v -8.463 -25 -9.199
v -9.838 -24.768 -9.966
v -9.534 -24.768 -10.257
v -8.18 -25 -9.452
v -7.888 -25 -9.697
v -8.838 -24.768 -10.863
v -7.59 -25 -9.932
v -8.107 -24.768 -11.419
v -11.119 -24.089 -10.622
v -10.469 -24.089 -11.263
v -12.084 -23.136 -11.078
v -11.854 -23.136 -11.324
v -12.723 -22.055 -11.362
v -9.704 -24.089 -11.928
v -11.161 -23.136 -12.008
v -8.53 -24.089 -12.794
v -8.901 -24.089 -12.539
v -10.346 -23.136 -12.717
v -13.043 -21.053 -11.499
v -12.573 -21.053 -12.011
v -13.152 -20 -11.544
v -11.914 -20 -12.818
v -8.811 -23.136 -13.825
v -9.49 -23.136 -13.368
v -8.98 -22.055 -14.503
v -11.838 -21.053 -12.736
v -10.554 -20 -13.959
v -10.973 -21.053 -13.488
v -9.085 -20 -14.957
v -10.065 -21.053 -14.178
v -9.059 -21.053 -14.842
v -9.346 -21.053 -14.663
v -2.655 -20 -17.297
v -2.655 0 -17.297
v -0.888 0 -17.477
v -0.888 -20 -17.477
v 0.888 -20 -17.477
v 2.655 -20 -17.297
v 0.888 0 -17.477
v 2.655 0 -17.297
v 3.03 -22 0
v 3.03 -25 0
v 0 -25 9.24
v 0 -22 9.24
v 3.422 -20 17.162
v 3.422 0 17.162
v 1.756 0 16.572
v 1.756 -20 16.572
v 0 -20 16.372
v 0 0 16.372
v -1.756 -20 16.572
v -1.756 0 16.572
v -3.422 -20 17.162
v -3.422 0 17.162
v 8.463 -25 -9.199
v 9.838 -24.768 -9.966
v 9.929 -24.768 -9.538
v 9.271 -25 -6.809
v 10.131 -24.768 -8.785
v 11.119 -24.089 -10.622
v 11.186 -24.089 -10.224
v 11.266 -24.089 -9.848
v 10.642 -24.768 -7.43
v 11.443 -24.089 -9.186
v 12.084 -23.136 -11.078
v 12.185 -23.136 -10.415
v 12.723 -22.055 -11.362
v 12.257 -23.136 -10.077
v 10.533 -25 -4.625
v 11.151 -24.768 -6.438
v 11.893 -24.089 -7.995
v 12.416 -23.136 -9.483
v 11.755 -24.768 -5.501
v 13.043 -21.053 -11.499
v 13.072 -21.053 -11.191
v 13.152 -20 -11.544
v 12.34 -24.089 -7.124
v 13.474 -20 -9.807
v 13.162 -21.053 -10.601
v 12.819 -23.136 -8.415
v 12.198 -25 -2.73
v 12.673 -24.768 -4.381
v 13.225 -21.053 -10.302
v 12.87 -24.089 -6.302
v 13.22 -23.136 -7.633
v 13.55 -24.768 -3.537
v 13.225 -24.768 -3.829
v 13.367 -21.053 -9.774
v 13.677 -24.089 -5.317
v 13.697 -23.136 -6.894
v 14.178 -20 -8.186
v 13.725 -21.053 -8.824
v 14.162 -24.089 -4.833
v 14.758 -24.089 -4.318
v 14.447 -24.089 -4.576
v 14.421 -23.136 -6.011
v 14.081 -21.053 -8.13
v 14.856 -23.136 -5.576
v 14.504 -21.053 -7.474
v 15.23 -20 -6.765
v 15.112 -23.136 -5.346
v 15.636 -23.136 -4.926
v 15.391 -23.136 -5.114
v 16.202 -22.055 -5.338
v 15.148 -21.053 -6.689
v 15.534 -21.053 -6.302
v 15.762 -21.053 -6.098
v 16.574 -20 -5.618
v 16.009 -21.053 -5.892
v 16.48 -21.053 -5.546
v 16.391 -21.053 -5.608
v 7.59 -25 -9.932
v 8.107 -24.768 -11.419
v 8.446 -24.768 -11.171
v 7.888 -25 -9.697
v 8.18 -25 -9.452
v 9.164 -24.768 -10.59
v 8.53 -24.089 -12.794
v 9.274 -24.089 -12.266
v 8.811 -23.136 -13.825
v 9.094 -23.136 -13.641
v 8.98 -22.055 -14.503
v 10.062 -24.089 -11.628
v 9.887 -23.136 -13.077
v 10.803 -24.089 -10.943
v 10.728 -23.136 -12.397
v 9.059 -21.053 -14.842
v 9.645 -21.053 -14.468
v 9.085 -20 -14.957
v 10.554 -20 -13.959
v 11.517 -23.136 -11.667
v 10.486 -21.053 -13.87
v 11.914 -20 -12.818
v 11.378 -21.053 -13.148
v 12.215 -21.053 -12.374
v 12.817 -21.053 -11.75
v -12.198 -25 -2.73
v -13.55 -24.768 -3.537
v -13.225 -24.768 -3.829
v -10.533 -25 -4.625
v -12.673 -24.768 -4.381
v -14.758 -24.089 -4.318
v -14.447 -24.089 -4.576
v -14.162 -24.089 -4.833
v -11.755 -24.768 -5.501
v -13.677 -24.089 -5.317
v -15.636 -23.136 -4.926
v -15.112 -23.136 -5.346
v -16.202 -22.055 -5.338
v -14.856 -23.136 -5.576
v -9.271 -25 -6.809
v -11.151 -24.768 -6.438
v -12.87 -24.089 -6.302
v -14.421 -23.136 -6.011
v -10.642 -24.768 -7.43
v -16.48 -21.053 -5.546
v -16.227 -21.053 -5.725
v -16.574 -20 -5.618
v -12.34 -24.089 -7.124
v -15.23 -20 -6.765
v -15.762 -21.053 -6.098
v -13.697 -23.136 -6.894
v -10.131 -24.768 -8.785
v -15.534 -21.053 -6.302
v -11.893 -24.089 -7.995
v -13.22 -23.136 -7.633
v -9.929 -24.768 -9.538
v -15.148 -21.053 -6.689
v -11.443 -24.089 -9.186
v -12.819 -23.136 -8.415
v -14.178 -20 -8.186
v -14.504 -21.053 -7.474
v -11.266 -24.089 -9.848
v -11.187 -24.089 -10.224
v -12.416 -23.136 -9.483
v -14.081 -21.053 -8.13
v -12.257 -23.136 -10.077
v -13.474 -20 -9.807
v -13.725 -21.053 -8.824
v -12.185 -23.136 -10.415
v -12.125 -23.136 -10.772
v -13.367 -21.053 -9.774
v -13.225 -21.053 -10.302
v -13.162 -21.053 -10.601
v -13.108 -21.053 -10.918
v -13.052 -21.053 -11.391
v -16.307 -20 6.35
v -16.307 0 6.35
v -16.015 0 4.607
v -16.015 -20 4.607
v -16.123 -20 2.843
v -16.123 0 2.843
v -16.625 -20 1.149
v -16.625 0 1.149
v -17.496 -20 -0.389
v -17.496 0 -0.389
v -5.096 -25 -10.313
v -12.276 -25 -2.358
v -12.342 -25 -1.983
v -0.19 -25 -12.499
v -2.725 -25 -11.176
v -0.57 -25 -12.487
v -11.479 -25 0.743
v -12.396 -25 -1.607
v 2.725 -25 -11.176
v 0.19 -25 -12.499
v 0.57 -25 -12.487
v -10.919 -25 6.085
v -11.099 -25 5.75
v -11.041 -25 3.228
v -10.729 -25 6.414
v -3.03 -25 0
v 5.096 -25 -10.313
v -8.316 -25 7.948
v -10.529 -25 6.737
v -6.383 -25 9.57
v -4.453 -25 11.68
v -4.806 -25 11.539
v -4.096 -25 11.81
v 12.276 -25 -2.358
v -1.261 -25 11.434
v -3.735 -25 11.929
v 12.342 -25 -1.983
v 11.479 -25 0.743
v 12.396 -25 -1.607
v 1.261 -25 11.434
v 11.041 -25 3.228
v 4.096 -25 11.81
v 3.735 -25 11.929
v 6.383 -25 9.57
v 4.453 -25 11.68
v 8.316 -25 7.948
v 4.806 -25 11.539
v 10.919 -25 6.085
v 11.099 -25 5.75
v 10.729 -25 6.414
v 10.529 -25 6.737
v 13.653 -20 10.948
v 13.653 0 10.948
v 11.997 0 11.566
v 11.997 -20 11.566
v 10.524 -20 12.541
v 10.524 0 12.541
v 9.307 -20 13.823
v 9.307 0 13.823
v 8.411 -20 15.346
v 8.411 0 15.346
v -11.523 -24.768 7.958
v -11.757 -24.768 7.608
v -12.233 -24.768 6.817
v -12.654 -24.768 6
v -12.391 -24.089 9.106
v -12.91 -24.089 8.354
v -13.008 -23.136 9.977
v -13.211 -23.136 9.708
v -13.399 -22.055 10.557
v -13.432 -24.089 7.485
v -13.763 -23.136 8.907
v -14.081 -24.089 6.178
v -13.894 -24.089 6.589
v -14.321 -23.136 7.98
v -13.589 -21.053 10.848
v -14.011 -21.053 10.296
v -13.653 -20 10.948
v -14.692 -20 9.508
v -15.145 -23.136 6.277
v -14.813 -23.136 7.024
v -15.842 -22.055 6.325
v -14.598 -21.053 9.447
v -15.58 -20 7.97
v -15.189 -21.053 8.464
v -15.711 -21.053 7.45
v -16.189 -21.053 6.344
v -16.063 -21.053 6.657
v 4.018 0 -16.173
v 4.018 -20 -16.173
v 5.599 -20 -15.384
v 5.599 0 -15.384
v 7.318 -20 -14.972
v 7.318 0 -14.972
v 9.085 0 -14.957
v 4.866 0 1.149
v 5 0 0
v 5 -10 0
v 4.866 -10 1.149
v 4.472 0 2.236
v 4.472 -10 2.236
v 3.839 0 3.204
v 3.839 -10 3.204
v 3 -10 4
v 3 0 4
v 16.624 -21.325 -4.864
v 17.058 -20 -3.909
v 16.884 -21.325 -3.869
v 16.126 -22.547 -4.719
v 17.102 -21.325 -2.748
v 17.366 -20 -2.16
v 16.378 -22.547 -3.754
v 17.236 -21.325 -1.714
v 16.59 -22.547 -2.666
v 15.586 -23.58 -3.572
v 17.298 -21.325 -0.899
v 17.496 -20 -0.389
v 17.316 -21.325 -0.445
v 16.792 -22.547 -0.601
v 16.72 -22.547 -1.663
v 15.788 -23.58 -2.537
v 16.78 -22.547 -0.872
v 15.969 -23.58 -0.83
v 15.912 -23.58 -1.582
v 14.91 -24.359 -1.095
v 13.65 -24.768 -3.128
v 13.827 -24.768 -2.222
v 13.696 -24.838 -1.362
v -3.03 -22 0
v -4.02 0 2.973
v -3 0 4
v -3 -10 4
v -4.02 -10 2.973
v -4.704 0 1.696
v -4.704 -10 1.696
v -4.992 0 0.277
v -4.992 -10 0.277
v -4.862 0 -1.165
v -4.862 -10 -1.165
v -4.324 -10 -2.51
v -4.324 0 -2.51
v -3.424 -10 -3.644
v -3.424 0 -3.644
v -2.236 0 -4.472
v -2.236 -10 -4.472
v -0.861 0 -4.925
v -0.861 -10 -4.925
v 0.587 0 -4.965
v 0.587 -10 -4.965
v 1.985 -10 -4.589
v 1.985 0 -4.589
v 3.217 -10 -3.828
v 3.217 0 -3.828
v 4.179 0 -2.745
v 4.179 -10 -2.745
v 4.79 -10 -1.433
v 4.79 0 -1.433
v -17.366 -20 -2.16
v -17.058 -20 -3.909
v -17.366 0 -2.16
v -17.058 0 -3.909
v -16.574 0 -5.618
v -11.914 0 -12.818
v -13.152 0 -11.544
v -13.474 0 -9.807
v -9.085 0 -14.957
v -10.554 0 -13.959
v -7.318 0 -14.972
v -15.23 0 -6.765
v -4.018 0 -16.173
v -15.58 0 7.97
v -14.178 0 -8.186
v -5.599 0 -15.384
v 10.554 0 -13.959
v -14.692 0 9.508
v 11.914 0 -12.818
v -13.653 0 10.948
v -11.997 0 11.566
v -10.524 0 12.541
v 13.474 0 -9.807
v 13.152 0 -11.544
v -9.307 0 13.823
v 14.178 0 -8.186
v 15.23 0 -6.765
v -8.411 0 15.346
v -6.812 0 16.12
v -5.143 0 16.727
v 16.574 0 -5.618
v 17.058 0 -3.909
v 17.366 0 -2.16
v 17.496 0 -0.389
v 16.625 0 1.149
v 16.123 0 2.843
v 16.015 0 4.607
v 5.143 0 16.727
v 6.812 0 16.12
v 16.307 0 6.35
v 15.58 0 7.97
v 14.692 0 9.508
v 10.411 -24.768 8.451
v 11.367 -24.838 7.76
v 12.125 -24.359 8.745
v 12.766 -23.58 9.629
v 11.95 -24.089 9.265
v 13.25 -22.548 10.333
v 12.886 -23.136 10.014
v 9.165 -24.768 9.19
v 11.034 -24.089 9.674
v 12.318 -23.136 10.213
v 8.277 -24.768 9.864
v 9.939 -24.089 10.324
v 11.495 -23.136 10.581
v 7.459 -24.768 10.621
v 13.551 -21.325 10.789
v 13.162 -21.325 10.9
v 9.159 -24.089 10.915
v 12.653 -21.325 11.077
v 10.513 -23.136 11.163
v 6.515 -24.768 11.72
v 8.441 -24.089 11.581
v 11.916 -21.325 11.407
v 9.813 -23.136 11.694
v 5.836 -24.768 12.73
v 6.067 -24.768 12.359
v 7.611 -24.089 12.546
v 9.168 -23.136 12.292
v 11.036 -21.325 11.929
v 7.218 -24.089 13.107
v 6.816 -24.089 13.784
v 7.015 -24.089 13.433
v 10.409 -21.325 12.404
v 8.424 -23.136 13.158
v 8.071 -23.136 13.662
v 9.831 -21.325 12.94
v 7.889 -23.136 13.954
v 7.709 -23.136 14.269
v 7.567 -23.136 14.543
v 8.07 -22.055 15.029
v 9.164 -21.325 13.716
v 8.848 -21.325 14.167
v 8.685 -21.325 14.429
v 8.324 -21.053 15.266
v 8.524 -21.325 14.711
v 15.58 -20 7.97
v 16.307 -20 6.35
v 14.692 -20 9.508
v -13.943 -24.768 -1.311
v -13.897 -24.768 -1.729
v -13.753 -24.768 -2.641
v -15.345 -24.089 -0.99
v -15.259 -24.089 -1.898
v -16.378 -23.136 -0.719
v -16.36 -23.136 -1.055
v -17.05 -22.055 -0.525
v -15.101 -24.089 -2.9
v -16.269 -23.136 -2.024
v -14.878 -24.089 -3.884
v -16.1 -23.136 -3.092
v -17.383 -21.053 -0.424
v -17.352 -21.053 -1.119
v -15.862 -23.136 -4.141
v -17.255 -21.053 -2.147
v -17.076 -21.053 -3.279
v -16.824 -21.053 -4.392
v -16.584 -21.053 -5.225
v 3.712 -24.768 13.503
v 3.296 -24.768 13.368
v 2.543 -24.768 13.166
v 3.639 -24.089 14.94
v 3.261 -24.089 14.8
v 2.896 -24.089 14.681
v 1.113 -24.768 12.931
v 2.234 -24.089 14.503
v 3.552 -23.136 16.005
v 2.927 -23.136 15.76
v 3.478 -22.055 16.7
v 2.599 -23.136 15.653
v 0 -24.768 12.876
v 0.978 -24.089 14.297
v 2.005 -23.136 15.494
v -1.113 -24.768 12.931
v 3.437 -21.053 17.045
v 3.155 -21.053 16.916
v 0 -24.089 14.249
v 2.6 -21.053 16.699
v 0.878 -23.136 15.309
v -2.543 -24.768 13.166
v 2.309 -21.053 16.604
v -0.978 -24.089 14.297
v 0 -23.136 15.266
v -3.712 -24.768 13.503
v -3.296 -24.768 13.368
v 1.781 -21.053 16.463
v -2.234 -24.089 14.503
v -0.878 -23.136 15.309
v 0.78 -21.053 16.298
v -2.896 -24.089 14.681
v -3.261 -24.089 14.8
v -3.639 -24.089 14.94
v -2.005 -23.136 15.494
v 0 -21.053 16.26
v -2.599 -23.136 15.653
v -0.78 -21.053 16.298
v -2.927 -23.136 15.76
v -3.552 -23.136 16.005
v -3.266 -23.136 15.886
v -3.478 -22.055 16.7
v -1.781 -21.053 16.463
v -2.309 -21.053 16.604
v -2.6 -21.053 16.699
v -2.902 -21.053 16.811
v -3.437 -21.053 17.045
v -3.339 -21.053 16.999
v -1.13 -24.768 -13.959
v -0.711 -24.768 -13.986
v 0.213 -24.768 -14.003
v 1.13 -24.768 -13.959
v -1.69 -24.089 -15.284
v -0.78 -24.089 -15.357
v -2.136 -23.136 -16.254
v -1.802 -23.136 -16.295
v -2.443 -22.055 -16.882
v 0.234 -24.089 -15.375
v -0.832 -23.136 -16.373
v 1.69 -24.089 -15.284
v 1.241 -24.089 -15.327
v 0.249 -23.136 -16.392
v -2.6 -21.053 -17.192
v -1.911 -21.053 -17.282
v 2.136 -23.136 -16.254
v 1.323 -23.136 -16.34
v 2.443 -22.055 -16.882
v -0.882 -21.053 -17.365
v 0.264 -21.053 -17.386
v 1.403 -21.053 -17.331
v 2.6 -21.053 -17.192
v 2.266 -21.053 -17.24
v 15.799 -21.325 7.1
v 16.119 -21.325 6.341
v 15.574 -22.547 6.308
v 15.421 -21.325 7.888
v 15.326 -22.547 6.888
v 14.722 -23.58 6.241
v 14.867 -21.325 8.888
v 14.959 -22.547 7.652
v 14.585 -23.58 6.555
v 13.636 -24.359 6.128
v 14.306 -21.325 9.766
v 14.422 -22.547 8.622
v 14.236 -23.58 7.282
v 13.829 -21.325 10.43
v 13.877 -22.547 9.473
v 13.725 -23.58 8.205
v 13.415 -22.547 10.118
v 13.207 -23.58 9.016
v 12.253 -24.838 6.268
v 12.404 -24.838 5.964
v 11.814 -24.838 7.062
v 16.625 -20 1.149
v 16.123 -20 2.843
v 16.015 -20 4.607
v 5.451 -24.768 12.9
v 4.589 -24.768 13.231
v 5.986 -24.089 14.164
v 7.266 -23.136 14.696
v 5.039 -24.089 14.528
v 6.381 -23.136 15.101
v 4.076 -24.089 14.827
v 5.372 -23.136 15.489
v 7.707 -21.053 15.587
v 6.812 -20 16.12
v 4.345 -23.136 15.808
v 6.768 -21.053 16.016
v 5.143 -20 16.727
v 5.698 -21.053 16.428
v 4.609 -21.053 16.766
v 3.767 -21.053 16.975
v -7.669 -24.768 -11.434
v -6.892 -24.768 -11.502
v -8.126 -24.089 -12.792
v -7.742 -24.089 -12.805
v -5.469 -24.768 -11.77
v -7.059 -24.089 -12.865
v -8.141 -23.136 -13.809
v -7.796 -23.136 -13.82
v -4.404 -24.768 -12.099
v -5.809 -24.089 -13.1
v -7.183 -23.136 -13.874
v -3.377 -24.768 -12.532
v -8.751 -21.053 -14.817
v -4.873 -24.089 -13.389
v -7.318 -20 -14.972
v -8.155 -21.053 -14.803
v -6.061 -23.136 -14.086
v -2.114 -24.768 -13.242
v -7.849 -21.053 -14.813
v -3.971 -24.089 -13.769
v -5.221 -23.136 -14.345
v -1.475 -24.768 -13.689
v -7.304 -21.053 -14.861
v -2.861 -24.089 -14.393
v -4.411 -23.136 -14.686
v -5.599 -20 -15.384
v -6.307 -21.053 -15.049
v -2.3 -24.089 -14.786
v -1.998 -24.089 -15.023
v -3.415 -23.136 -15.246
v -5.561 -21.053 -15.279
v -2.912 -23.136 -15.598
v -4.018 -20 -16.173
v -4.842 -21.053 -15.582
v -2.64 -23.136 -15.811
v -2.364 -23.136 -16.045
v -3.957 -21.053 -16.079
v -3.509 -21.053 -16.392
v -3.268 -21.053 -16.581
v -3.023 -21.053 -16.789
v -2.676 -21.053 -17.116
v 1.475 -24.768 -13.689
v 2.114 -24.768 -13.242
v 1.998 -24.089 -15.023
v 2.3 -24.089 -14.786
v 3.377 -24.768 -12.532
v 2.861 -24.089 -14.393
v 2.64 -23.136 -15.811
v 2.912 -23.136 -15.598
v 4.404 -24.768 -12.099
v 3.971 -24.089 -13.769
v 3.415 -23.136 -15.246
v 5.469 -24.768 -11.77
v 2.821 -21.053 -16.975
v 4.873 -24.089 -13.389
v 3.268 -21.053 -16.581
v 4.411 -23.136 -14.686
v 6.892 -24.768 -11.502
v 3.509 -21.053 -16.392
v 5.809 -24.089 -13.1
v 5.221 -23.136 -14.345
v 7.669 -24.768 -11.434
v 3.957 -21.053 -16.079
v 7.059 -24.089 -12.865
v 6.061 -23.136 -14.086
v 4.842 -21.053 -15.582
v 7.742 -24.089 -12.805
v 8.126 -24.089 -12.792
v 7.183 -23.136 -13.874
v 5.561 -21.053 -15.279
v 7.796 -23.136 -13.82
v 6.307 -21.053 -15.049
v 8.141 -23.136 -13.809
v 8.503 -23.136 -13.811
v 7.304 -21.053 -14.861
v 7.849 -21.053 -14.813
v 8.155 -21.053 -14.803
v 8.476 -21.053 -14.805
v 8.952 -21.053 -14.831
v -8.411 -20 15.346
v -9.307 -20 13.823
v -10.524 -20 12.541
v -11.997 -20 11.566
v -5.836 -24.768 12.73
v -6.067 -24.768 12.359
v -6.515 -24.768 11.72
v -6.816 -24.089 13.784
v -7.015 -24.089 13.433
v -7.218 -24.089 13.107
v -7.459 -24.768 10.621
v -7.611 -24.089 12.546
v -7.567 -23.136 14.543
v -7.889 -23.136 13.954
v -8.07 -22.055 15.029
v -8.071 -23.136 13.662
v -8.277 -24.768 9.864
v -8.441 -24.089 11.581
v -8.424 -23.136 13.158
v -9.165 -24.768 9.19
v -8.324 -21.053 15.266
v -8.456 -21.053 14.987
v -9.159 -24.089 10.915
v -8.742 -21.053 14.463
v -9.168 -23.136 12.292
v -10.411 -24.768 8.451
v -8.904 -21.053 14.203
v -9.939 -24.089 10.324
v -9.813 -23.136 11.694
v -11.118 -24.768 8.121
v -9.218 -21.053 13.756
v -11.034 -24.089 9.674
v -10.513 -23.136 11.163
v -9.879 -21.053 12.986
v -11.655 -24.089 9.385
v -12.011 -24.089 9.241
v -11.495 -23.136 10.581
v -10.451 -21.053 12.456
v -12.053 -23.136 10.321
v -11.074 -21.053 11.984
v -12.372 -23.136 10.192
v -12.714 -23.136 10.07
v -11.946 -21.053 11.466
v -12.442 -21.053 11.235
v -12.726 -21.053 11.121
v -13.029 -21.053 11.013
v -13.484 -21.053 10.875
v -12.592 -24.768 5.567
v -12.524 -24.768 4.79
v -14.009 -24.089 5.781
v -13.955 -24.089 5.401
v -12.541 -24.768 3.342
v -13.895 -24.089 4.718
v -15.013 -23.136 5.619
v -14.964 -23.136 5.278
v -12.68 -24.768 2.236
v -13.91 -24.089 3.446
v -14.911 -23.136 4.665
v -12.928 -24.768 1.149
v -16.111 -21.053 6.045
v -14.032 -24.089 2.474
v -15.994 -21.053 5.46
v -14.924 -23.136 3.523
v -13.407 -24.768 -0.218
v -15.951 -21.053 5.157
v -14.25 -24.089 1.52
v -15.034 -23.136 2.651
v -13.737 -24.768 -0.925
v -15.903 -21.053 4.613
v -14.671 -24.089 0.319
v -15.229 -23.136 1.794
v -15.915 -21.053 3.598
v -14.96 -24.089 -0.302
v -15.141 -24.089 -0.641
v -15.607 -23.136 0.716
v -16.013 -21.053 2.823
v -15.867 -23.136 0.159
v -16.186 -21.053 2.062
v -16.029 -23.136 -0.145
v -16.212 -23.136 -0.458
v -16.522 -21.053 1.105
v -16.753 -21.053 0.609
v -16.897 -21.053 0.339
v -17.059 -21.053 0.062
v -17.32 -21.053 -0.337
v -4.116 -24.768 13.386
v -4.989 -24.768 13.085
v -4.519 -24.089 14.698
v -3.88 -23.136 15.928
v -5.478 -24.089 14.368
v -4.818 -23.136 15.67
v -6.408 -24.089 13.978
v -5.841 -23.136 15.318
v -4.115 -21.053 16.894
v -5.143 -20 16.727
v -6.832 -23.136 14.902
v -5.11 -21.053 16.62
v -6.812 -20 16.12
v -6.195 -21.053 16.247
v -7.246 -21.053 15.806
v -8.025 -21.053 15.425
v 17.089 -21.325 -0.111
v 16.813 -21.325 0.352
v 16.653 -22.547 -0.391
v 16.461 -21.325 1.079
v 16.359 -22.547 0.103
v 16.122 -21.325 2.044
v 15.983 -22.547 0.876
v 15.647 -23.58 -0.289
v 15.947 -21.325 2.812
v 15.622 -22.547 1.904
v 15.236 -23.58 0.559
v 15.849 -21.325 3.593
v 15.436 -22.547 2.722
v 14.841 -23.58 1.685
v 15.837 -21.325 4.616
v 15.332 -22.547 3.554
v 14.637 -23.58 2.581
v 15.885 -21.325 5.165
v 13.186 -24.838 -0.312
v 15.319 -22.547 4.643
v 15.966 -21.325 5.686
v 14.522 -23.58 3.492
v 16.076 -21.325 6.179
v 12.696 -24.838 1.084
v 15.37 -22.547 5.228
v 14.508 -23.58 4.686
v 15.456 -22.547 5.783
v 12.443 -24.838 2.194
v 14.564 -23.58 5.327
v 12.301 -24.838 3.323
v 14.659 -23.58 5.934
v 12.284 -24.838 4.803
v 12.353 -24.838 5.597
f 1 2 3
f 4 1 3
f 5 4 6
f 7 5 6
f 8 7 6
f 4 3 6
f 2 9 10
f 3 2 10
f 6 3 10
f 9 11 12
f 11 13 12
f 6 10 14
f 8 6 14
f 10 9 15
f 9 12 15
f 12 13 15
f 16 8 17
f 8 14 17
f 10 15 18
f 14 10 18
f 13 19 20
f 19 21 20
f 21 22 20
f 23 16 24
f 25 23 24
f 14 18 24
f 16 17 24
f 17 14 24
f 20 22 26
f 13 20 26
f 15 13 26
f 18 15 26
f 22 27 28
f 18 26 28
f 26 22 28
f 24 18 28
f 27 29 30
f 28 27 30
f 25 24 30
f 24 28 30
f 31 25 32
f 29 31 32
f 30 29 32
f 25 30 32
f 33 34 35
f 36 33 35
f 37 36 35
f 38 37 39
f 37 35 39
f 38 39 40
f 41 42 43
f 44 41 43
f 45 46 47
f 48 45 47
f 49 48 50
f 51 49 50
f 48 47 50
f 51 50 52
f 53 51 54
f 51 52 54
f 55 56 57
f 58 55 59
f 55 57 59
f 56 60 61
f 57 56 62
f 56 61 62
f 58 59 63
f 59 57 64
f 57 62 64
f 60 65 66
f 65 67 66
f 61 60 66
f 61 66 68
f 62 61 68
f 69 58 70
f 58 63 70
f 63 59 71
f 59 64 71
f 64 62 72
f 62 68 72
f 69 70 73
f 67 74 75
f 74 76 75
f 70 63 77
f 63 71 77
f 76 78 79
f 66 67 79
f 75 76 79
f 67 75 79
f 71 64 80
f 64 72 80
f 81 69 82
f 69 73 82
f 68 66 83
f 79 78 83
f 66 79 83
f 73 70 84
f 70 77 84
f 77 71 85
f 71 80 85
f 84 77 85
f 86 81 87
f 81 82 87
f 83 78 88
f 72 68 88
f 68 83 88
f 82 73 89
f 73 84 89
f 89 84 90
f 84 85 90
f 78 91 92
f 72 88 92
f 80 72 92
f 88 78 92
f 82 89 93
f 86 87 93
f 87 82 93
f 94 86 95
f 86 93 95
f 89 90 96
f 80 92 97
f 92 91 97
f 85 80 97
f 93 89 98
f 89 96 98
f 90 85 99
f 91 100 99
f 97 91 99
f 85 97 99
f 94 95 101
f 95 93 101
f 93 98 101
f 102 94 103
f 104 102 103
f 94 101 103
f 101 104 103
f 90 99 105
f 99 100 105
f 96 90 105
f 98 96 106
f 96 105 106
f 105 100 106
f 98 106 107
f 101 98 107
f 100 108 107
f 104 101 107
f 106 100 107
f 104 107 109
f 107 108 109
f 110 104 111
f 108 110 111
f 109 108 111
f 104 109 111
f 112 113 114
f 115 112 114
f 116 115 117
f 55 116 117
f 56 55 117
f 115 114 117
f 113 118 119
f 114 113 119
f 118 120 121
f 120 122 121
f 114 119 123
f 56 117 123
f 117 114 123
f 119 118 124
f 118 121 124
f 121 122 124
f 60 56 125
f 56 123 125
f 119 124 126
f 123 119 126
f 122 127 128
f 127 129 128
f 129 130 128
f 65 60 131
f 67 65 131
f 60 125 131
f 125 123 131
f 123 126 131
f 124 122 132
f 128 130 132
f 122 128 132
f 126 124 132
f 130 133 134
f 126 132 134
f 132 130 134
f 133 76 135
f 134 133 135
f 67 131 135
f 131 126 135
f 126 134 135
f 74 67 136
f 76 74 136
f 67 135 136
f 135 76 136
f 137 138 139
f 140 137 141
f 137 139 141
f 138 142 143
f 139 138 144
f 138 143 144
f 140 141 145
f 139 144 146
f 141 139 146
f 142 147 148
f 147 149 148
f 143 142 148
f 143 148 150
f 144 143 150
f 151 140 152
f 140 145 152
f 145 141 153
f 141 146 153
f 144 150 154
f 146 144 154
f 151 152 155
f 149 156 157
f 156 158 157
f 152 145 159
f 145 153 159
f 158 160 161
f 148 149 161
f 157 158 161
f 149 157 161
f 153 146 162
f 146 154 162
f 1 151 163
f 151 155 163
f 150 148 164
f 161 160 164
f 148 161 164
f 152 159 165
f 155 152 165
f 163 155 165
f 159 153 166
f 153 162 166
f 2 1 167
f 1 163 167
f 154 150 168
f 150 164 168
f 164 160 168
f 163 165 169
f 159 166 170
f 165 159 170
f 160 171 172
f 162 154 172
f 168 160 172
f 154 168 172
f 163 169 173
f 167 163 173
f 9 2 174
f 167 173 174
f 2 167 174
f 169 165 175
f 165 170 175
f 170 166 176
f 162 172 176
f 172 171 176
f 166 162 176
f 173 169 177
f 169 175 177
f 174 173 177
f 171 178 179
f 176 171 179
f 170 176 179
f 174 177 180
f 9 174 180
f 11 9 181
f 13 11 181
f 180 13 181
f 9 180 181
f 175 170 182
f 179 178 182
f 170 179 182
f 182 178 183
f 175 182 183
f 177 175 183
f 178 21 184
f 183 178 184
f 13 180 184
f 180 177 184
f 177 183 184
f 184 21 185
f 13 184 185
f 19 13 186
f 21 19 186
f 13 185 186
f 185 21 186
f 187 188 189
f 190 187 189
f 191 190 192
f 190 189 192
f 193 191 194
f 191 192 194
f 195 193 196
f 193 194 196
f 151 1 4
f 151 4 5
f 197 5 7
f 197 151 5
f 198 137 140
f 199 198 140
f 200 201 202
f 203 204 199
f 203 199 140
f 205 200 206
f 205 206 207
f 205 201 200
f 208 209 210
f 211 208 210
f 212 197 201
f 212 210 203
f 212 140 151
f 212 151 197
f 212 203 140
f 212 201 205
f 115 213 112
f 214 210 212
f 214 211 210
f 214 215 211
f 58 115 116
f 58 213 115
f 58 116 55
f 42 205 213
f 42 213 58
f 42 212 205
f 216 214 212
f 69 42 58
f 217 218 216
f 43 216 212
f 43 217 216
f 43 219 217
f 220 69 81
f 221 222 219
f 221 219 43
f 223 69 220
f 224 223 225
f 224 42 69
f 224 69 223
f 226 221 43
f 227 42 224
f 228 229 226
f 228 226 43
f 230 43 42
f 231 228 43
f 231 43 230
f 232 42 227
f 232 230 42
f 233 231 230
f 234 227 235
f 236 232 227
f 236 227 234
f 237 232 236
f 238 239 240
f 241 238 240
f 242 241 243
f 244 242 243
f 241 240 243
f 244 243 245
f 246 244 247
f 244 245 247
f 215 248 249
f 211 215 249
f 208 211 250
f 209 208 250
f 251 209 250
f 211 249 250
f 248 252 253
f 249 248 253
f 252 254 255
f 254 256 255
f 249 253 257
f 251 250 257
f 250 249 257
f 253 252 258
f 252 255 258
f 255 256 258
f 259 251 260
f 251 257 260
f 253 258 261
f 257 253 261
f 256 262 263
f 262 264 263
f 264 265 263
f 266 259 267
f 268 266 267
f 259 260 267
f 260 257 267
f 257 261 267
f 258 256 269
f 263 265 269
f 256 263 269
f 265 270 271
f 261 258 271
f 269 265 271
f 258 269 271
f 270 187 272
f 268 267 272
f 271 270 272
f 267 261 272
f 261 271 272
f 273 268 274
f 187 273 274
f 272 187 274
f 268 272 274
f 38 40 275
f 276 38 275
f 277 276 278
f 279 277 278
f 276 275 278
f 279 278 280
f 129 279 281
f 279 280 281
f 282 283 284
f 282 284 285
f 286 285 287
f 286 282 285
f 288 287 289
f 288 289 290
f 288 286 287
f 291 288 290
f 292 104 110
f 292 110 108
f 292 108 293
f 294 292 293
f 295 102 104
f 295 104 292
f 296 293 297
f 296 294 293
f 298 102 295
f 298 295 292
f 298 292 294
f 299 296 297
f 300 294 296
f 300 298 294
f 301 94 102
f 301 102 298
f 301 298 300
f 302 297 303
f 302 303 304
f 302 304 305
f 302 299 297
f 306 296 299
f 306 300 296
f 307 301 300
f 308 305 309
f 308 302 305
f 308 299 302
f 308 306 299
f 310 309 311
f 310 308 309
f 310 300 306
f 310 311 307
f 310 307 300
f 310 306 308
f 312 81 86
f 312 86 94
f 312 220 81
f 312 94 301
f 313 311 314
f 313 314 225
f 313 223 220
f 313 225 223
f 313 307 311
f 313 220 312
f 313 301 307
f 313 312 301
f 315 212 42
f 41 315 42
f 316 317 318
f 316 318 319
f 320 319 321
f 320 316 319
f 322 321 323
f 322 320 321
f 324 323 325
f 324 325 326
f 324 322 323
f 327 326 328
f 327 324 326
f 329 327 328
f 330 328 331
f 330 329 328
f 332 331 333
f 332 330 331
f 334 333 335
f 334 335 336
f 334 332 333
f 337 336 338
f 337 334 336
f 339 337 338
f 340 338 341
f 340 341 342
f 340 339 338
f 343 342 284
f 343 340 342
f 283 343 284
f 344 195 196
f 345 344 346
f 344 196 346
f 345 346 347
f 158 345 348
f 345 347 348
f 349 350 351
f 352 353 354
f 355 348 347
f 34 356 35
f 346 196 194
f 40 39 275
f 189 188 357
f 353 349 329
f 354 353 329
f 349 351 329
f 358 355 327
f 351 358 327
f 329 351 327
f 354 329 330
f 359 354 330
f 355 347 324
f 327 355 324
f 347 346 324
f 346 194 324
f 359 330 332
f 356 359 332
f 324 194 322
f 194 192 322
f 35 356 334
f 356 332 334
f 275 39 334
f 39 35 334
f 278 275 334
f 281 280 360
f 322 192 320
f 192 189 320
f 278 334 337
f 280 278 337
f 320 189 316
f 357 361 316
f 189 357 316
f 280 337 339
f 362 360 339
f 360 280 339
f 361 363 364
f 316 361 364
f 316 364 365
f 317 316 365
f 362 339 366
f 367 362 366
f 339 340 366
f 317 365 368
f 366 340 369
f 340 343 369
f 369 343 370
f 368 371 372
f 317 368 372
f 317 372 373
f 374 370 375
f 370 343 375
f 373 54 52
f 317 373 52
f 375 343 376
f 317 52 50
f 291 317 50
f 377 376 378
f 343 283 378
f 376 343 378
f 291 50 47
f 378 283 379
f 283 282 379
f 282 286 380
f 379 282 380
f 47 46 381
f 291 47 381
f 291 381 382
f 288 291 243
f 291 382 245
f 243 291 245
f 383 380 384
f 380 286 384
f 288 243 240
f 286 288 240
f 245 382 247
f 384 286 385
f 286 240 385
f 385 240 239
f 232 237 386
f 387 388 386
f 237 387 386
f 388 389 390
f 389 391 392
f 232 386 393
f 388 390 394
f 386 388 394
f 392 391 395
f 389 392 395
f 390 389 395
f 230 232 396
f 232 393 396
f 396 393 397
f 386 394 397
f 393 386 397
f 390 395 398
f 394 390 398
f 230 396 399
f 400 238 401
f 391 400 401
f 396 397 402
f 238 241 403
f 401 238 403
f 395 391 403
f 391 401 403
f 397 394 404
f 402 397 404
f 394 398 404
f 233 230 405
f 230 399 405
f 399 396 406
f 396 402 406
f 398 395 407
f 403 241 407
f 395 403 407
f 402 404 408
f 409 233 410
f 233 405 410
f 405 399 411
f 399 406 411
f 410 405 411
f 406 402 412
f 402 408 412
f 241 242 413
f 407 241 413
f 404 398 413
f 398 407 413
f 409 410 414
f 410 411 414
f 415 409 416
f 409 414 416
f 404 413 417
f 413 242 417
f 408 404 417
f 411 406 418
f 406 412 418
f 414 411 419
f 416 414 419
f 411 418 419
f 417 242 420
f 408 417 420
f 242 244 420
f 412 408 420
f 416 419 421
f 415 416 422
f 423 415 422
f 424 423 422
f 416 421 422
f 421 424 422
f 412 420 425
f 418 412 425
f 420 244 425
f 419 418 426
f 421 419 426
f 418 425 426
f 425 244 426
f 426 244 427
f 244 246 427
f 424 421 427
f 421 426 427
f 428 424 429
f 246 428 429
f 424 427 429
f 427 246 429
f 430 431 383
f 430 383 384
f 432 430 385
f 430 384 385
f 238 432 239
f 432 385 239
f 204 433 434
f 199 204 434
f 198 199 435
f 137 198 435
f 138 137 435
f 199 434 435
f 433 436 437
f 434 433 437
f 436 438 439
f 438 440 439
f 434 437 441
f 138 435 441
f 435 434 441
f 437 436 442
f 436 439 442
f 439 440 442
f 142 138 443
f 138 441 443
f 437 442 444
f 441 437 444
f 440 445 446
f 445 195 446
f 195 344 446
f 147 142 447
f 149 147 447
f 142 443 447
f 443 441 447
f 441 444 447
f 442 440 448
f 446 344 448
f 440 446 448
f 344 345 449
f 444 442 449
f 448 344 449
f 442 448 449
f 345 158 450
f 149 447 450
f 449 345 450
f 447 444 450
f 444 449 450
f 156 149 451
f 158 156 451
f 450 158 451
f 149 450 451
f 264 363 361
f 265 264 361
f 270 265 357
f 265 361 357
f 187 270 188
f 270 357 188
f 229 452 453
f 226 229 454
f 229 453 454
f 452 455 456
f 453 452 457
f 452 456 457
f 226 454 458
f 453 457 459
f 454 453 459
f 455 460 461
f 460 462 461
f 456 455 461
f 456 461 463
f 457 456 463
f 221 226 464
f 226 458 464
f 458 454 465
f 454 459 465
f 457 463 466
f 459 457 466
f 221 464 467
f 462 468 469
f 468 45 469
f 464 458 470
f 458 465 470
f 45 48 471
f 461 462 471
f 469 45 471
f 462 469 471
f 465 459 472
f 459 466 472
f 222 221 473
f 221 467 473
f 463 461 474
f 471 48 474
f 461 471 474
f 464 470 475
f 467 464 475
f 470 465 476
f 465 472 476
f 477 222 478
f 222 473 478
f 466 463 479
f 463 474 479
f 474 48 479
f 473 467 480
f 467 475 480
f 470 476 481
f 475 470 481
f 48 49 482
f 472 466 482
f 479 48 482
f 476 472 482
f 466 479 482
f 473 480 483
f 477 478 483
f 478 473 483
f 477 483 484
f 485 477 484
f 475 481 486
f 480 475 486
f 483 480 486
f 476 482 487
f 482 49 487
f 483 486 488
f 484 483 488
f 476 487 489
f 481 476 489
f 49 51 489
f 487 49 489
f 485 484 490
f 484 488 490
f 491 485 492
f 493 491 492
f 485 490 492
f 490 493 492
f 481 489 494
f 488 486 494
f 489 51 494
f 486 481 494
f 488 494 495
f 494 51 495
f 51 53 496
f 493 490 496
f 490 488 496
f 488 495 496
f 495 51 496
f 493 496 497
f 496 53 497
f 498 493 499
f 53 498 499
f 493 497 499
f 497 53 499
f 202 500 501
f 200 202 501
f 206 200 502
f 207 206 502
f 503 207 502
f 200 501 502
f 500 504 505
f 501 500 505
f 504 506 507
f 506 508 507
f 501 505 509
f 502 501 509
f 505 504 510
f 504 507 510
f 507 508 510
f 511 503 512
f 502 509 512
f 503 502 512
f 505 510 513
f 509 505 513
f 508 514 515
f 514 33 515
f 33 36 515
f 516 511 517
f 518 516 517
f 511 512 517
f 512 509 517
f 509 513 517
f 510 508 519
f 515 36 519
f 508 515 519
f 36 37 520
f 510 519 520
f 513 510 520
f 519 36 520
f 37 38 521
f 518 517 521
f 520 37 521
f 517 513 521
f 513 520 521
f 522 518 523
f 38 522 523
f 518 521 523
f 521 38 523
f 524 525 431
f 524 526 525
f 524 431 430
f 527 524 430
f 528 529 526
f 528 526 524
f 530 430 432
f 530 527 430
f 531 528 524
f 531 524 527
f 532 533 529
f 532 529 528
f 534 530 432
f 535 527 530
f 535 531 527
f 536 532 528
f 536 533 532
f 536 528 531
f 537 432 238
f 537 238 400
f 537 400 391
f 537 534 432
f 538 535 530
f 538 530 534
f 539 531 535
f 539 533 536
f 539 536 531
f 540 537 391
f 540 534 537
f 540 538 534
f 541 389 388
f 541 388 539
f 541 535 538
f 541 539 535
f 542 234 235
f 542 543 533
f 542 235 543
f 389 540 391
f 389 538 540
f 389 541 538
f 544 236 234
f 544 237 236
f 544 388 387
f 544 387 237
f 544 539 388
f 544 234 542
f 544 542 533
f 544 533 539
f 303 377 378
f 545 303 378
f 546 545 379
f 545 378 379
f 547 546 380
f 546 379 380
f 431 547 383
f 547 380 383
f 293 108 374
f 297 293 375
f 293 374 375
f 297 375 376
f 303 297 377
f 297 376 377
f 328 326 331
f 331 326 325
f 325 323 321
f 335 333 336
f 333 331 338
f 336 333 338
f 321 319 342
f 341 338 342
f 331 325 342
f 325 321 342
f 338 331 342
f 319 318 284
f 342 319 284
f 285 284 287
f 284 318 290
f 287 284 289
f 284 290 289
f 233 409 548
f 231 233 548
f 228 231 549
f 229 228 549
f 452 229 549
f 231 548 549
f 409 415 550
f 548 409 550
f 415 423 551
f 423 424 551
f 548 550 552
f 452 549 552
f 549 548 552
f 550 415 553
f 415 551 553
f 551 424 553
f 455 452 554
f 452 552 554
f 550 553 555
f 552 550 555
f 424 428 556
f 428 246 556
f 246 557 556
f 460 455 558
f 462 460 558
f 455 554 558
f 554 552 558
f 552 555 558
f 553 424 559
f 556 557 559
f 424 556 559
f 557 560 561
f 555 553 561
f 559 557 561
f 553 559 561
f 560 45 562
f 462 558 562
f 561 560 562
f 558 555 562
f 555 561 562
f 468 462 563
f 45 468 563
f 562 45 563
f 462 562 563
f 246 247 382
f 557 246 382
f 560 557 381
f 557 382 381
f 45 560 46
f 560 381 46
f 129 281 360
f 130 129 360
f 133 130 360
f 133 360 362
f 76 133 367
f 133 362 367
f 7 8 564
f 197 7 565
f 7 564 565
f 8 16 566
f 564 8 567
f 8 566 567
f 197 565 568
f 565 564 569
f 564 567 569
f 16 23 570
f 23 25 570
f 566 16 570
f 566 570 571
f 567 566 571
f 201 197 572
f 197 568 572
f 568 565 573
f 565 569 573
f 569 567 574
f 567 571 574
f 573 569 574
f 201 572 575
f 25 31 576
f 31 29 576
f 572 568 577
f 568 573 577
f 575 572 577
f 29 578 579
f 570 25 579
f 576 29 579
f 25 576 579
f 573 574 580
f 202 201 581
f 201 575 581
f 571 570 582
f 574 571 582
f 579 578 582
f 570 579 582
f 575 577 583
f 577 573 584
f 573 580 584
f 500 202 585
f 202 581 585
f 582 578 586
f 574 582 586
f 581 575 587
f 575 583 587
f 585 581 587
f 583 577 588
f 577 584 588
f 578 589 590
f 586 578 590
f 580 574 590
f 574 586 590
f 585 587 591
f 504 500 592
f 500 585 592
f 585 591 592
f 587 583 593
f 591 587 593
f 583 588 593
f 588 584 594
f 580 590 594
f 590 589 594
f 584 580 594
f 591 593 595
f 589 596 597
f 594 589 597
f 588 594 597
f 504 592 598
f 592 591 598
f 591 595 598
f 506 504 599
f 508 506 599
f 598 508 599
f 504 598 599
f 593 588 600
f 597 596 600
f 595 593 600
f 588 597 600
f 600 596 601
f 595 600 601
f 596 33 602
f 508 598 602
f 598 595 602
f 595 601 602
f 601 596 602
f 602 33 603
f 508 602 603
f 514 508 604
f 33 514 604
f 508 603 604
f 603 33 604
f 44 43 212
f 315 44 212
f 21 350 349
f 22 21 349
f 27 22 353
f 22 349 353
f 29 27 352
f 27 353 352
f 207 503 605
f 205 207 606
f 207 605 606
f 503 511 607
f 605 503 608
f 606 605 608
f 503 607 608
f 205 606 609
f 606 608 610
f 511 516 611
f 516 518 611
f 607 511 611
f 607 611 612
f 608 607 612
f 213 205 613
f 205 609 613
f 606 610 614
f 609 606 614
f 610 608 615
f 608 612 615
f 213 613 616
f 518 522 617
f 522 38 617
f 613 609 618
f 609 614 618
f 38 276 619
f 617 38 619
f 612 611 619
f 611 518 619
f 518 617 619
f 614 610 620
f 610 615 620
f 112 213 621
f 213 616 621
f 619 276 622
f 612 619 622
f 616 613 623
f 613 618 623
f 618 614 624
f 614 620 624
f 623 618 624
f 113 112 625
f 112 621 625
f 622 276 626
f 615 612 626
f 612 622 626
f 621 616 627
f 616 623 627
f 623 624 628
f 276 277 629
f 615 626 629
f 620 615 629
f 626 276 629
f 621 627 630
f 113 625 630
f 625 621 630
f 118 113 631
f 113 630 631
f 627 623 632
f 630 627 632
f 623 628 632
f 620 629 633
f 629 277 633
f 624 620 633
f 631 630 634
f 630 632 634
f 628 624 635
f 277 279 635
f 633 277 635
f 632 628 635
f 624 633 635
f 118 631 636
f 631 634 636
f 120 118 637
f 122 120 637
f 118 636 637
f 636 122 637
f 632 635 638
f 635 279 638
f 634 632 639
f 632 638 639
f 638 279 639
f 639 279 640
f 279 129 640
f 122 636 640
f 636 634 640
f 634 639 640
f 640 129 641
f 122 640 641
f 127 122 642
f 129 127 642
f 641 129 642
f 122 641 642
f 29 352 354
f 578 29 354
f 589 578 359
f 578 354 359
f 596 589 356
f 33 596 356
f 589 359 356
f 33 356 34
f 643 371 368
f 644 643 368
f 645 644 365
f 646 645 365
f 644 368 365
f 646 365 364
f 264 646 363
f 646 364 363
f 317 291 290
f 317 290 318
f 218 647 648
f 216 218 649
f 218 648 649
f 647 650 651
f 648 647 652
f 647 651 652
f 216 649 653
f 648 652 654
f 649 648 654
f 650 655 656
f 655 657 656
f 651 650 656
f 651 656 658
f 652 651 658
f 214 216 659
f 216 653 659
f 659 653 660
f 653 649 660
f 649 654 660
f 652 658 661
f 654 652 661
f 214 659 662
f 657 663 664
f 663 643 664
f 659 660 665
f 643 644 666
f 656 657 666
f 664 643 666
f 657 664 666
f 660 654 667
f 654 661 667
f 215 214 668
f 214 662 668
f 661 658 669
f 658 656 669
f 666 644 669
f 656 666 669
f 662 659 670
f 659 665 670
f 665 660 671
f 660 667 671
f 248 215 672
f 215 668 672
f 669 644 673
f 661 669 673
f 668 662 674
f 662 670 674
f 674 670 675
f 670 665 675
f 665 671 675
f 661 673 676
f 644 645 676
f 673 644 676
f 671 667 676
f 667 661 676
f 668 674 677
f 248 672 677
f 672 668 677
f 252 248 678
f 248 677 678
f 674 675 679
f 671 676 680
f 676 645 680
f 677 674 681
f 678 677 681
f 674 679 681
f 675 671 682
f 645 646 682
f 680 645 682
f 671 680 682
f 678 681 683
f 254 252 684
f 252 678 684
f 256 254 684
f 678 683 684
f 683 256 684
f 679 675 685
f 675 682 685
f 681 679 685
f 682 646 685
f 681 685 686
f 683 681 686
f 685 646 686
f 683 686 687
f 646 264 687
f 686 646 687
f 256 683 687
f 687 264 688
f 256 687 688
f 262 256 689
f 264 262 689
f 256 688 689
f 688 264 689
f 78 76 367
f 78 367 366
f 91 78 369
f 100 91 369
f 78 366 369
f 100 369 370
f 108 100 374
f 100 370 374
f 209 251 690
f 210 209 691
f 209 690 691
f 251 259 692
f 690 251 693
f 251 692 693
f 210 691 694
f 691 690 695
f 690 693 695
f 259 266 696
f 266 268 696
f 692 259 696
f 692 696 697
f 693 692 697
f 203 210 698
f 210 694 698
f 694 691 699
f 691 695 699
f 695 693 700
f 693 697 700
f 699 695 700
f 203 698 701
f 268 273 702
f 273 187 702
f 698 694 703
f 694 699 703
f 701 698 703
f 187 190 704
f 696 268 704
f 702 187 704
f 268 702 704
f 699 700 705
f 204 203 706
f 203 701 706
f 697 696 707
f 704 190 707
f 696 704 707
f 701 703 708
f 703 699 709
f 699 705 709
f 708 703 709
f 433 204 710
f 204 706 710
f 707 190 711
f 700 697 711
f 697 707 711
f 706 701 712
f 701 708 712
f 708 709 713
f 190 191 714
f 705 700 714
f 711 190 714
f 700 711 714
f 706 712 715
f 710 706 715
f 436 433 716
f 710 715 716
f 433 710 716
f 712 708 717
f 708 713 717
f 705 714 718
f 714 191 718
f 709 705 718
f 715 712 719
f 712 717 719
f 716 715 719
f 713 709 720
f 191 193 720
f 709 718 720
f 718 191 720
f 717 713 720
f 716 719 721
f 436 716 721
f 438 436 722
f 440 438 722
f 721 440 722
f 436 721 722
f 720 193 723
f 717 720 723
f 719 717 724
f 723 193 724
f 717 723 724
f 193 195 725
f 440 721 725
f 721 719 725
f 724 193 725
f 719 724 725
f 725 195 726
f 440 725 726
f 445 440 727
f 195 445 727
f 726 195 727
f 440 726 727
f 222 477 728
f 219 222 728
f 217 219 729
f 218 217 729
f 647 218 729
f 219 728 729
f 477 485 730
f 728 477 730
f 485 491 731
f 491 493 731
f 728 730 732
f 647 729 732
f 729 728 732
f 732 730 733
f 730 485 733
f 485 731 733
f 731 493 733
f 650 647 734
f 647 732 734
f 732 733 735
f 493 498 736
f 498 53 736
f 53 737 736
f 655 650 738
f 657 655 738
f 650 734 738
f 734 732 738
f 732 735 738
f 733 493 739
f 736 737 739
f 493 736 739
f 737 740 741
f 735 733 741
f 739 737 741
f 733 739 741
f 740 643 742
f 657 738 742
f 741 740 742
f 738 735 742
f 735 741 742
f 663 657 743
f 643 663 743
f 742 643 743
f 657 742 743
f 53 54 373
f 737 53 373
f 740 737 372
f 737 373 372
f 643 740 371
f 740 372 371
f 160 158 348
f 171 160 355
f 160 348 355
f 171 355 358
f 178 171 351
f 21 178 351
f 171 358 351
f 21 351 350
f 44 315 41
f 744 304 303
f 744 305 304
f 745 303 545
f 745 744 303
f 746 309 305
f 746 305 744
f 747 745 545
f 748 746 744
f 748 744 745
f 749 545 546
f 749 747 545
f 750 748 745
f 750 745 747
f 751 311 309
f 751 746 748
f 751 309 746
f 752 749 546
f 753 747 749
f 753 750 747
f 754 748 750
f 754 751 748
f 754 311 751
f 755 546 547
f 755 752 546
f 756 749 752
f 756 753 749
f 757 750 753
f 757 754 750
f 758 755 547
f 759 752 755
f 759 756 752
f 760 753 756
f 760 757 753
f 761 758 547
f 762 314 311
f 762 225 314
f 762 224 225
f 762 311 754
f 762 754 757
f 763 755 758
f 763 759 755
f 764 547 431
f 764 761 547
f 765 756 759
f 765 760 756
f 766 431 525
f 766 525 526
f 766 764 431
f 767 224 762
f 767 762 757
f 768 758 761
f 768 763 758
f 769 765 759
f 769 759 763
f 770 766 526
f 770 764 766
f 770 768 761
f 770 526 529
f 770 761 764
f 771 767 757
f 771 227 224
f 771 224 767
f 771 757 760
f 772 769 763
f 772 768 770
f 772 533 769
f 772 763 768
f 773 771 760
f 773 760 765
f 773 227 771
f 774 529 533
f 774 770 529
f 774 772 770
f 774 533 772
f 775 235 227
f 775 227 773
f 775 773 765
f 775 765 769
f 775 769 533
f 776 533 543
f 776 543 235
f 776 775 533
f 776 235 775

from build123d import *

# Parameters (mm, degrees)
F1_DEPTH = 25
F2_DEPTH = 10
F3_R     = 5
F5_DEPTH = 3


with BuildPart() as f1:
    # F0 (on Front) → F1 (new body)
    with BuildSketch(Plane.XZ):
        with BuildLine():
            ThreePointArc((17.495668, -0.389351), (16.123041, 2.842927), (16.307385, 6.349741))
            ThreePointArc((16.307385, 6.349741), (15.155445, 8.75), (13.652729, 10.947739))
            ThreePointArc((13.652729, 10.947739), (10.523567, 12.541499), (8.410647, 15.346368))
            ThreePointArc((8.410647, 15.346368), (5.985353, 16.444621), (3.421526, 17.16226))
            ThreePointArc((3.421526, 17.16226), (0, 16.371764), (-3.421526, 17.16226))
            ThreePointArc((-3.421526, 17.16226), (-5.985353, 16.444621), (-8.410647, 15.346368))
            ThreePointArc((-8.410647, 15.346368), (-10.523567, 12.541499), (-13.652729, 10.947739))
            ThreePointArc((-13.652729, 10.947739), (-15.155445, 8.75), (-16.307385, 6.349741))
            ThreePointArc((-16.307385, 6.349741), (-16.123041, 2.842927), (-17.495668, -0.389351))
            ThreePointArc((-17.495668, -0.389351), (-17.234136, -3.038843), (-16.573716, -5.618001))
            ThreePointArc((-16.573716, -5.618001), (-14.178364, -8.185882), (-13.15219, -11.544259))
            ThreePointArc((-13.15219, -11.544259), (-11.248783, -13.405778), (-9.085022, -14.957018))
            ThreePointArc((-9.085022, -14.957018), (-5.599473, -15.384426), (-2.654655, -17.29748))
            ThreePointArc((-2.654655, -17.29748), (0, -17.5), (2.654655, -17.29748))
            ThreePointArc((2.654655, -17.29748), (5.599473, -15.384426), (9.085022, -14.957018))
            ThreePointArc((9.085022, -14.957018), (11.248783, -13.405778), (13.15219, -11.544259))
            ThreePointArc((13.15219, -11.544259), (14.178364, -8.185882), (16.573716, -5.618001))
            ThreePointArc((16.573716, -5.618001), (17.234136, -3.038843), (17.495668, -0.389351))
        make_face()
        with BuildLine():
            ThreePointArc((3, 4), (4.472136, 2.236068), (5, 0))
            ThreePointArc((5, 0), (-2.236068, -4.472136), (-3, 4))
            ThreePointArc((-3, 4), (0, 5), (3, 4))
        make_face(mode=Mode.SUBTRACT)
        with BuildLine():
            Line((-3, 4), (3, 4))
            ThreePointArc((3, 4), (0, 5), (-3, 4))
        make_face()
        with BuildLine():
            ThreePointArc((-3, 4), (-2.236068, -4.472136), (5, 0))
            ThreePointArc((5, 0), (4.472136, 2.236068), (3, 4))
            Line((3, 4), (-3, 4))
        make_face()
    extrude(amount=F1_DEPTH)

    # F0 (on Front) → F2 (cut)
    with BuildSketch(Plane.XZ):
        with BuildLine():
            ThreePointArc((-3, 4), (-2.236068, -4.472136), (5, 0))
            ThreePointArc((5, 0), (4.472136, 2.236068), (3, 4))
            Line((3, 4), (-3, 4))
        make_face()
    extrude(amount=F2_DEPTH, mode=Mode.SUBTRACT)

    # F3
    f3_edges = [f1.edges().sort_by_distance(p)[0] for p in [
        (-5.599473, -25, -15.384426),
        (0, -25, -17.5),
        (5.599473, -25, -15.384426),
        (11.248783, -25, -13.405778),
        (14.178364, -25, -8.185882),
        (17.234136, -25, -3.038843),
        (16.123041, -25, 2.842927),
        (15.155445, -25, 8.75),
        (10.523567, -25, 12.541499),
        (5.985353, -25, 16.444621),
        (0, -25, 16.371764),
        (-5.985353, -25, 16.444621),
        (-10.523567, -25, 12.541499),
        (-15.155445, -25, 8.75),
        (-16.123041, -25, 2.842927),
        (-17.234136, -25, -3.038843),
        (-14.178364, -25, -8.185882),
        (-11.248783, -25, -13.405778),
    ]]
    fillet(f3_edges, radius=F3_R)

    # F4 (on face) → F5 (cut)
    with BuildSketch(Plane.XZ.offset(25)):
        Polygon((3.03, 0), (0, 9.24), (0, 0), align=None)
        Polygon((0, 0), (0, 9.24), (-3.03, 0), align=None)
    extrude(amount=-F5_DEPTH, mode=Mode.SUBTRACT)


solid = f1.part
